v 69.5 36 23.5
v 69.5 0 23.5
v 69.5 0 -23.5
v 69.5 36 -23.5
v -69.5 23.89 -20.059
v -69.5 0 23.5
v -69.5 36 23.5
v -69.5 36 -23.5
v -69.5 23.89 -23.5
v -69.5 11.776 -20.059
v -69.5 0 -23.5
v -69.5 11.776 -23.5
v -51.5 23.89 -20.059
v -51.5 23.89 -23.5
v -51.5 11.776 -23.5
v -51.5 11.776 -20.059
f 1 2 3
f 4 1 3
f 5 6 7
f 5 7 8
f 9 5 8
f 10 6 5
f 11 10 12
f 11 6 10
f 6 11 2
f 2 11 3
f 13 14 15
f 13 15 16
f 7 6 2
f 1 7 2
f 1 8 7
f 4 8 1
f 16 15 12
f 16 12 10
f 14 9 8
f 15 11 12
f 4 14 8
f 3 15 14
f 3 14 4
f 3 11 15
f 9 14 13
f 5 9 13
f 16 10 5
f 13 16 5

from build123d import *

# Parameters (mm, degrees)
SKETCH1_W           = 139
SKETCH1_H           = 47
BOSS_EXTRUDE1_DEPTH = 36
SKETCH2_W           = 3.441292391
SKETCH2_H           = 12.114310201
CUT_EXTRUDE1_DEPTH  = 18


with BuildPart() as part:
    # Sketch1 → Boss-Extrude1 (new body)
    with BuildSketch(Plane(origin=(0, 0, 0), x_dir=(1, 0, 0), z_dir=(0, 1, 0))):
        Rectangle(SKETCH1_W, SKETCH1_H)
    extrude(amount=BOSS_EXTRUDE1_DEPTH)

    # Sketch2 → Cut-Extrude1 (cut)
    with BuildSketch(Plane.ZY.offset(69.5)):
        with Locations((-21.779353805, 17.833070529)):
            Rectangle(SKETCH2_W, SKETCH2_H)
    extrude(amount=-CUT_EXTRUDE1_DEPTH, mode=Mode.SUBTRACT)


solid = part.part
